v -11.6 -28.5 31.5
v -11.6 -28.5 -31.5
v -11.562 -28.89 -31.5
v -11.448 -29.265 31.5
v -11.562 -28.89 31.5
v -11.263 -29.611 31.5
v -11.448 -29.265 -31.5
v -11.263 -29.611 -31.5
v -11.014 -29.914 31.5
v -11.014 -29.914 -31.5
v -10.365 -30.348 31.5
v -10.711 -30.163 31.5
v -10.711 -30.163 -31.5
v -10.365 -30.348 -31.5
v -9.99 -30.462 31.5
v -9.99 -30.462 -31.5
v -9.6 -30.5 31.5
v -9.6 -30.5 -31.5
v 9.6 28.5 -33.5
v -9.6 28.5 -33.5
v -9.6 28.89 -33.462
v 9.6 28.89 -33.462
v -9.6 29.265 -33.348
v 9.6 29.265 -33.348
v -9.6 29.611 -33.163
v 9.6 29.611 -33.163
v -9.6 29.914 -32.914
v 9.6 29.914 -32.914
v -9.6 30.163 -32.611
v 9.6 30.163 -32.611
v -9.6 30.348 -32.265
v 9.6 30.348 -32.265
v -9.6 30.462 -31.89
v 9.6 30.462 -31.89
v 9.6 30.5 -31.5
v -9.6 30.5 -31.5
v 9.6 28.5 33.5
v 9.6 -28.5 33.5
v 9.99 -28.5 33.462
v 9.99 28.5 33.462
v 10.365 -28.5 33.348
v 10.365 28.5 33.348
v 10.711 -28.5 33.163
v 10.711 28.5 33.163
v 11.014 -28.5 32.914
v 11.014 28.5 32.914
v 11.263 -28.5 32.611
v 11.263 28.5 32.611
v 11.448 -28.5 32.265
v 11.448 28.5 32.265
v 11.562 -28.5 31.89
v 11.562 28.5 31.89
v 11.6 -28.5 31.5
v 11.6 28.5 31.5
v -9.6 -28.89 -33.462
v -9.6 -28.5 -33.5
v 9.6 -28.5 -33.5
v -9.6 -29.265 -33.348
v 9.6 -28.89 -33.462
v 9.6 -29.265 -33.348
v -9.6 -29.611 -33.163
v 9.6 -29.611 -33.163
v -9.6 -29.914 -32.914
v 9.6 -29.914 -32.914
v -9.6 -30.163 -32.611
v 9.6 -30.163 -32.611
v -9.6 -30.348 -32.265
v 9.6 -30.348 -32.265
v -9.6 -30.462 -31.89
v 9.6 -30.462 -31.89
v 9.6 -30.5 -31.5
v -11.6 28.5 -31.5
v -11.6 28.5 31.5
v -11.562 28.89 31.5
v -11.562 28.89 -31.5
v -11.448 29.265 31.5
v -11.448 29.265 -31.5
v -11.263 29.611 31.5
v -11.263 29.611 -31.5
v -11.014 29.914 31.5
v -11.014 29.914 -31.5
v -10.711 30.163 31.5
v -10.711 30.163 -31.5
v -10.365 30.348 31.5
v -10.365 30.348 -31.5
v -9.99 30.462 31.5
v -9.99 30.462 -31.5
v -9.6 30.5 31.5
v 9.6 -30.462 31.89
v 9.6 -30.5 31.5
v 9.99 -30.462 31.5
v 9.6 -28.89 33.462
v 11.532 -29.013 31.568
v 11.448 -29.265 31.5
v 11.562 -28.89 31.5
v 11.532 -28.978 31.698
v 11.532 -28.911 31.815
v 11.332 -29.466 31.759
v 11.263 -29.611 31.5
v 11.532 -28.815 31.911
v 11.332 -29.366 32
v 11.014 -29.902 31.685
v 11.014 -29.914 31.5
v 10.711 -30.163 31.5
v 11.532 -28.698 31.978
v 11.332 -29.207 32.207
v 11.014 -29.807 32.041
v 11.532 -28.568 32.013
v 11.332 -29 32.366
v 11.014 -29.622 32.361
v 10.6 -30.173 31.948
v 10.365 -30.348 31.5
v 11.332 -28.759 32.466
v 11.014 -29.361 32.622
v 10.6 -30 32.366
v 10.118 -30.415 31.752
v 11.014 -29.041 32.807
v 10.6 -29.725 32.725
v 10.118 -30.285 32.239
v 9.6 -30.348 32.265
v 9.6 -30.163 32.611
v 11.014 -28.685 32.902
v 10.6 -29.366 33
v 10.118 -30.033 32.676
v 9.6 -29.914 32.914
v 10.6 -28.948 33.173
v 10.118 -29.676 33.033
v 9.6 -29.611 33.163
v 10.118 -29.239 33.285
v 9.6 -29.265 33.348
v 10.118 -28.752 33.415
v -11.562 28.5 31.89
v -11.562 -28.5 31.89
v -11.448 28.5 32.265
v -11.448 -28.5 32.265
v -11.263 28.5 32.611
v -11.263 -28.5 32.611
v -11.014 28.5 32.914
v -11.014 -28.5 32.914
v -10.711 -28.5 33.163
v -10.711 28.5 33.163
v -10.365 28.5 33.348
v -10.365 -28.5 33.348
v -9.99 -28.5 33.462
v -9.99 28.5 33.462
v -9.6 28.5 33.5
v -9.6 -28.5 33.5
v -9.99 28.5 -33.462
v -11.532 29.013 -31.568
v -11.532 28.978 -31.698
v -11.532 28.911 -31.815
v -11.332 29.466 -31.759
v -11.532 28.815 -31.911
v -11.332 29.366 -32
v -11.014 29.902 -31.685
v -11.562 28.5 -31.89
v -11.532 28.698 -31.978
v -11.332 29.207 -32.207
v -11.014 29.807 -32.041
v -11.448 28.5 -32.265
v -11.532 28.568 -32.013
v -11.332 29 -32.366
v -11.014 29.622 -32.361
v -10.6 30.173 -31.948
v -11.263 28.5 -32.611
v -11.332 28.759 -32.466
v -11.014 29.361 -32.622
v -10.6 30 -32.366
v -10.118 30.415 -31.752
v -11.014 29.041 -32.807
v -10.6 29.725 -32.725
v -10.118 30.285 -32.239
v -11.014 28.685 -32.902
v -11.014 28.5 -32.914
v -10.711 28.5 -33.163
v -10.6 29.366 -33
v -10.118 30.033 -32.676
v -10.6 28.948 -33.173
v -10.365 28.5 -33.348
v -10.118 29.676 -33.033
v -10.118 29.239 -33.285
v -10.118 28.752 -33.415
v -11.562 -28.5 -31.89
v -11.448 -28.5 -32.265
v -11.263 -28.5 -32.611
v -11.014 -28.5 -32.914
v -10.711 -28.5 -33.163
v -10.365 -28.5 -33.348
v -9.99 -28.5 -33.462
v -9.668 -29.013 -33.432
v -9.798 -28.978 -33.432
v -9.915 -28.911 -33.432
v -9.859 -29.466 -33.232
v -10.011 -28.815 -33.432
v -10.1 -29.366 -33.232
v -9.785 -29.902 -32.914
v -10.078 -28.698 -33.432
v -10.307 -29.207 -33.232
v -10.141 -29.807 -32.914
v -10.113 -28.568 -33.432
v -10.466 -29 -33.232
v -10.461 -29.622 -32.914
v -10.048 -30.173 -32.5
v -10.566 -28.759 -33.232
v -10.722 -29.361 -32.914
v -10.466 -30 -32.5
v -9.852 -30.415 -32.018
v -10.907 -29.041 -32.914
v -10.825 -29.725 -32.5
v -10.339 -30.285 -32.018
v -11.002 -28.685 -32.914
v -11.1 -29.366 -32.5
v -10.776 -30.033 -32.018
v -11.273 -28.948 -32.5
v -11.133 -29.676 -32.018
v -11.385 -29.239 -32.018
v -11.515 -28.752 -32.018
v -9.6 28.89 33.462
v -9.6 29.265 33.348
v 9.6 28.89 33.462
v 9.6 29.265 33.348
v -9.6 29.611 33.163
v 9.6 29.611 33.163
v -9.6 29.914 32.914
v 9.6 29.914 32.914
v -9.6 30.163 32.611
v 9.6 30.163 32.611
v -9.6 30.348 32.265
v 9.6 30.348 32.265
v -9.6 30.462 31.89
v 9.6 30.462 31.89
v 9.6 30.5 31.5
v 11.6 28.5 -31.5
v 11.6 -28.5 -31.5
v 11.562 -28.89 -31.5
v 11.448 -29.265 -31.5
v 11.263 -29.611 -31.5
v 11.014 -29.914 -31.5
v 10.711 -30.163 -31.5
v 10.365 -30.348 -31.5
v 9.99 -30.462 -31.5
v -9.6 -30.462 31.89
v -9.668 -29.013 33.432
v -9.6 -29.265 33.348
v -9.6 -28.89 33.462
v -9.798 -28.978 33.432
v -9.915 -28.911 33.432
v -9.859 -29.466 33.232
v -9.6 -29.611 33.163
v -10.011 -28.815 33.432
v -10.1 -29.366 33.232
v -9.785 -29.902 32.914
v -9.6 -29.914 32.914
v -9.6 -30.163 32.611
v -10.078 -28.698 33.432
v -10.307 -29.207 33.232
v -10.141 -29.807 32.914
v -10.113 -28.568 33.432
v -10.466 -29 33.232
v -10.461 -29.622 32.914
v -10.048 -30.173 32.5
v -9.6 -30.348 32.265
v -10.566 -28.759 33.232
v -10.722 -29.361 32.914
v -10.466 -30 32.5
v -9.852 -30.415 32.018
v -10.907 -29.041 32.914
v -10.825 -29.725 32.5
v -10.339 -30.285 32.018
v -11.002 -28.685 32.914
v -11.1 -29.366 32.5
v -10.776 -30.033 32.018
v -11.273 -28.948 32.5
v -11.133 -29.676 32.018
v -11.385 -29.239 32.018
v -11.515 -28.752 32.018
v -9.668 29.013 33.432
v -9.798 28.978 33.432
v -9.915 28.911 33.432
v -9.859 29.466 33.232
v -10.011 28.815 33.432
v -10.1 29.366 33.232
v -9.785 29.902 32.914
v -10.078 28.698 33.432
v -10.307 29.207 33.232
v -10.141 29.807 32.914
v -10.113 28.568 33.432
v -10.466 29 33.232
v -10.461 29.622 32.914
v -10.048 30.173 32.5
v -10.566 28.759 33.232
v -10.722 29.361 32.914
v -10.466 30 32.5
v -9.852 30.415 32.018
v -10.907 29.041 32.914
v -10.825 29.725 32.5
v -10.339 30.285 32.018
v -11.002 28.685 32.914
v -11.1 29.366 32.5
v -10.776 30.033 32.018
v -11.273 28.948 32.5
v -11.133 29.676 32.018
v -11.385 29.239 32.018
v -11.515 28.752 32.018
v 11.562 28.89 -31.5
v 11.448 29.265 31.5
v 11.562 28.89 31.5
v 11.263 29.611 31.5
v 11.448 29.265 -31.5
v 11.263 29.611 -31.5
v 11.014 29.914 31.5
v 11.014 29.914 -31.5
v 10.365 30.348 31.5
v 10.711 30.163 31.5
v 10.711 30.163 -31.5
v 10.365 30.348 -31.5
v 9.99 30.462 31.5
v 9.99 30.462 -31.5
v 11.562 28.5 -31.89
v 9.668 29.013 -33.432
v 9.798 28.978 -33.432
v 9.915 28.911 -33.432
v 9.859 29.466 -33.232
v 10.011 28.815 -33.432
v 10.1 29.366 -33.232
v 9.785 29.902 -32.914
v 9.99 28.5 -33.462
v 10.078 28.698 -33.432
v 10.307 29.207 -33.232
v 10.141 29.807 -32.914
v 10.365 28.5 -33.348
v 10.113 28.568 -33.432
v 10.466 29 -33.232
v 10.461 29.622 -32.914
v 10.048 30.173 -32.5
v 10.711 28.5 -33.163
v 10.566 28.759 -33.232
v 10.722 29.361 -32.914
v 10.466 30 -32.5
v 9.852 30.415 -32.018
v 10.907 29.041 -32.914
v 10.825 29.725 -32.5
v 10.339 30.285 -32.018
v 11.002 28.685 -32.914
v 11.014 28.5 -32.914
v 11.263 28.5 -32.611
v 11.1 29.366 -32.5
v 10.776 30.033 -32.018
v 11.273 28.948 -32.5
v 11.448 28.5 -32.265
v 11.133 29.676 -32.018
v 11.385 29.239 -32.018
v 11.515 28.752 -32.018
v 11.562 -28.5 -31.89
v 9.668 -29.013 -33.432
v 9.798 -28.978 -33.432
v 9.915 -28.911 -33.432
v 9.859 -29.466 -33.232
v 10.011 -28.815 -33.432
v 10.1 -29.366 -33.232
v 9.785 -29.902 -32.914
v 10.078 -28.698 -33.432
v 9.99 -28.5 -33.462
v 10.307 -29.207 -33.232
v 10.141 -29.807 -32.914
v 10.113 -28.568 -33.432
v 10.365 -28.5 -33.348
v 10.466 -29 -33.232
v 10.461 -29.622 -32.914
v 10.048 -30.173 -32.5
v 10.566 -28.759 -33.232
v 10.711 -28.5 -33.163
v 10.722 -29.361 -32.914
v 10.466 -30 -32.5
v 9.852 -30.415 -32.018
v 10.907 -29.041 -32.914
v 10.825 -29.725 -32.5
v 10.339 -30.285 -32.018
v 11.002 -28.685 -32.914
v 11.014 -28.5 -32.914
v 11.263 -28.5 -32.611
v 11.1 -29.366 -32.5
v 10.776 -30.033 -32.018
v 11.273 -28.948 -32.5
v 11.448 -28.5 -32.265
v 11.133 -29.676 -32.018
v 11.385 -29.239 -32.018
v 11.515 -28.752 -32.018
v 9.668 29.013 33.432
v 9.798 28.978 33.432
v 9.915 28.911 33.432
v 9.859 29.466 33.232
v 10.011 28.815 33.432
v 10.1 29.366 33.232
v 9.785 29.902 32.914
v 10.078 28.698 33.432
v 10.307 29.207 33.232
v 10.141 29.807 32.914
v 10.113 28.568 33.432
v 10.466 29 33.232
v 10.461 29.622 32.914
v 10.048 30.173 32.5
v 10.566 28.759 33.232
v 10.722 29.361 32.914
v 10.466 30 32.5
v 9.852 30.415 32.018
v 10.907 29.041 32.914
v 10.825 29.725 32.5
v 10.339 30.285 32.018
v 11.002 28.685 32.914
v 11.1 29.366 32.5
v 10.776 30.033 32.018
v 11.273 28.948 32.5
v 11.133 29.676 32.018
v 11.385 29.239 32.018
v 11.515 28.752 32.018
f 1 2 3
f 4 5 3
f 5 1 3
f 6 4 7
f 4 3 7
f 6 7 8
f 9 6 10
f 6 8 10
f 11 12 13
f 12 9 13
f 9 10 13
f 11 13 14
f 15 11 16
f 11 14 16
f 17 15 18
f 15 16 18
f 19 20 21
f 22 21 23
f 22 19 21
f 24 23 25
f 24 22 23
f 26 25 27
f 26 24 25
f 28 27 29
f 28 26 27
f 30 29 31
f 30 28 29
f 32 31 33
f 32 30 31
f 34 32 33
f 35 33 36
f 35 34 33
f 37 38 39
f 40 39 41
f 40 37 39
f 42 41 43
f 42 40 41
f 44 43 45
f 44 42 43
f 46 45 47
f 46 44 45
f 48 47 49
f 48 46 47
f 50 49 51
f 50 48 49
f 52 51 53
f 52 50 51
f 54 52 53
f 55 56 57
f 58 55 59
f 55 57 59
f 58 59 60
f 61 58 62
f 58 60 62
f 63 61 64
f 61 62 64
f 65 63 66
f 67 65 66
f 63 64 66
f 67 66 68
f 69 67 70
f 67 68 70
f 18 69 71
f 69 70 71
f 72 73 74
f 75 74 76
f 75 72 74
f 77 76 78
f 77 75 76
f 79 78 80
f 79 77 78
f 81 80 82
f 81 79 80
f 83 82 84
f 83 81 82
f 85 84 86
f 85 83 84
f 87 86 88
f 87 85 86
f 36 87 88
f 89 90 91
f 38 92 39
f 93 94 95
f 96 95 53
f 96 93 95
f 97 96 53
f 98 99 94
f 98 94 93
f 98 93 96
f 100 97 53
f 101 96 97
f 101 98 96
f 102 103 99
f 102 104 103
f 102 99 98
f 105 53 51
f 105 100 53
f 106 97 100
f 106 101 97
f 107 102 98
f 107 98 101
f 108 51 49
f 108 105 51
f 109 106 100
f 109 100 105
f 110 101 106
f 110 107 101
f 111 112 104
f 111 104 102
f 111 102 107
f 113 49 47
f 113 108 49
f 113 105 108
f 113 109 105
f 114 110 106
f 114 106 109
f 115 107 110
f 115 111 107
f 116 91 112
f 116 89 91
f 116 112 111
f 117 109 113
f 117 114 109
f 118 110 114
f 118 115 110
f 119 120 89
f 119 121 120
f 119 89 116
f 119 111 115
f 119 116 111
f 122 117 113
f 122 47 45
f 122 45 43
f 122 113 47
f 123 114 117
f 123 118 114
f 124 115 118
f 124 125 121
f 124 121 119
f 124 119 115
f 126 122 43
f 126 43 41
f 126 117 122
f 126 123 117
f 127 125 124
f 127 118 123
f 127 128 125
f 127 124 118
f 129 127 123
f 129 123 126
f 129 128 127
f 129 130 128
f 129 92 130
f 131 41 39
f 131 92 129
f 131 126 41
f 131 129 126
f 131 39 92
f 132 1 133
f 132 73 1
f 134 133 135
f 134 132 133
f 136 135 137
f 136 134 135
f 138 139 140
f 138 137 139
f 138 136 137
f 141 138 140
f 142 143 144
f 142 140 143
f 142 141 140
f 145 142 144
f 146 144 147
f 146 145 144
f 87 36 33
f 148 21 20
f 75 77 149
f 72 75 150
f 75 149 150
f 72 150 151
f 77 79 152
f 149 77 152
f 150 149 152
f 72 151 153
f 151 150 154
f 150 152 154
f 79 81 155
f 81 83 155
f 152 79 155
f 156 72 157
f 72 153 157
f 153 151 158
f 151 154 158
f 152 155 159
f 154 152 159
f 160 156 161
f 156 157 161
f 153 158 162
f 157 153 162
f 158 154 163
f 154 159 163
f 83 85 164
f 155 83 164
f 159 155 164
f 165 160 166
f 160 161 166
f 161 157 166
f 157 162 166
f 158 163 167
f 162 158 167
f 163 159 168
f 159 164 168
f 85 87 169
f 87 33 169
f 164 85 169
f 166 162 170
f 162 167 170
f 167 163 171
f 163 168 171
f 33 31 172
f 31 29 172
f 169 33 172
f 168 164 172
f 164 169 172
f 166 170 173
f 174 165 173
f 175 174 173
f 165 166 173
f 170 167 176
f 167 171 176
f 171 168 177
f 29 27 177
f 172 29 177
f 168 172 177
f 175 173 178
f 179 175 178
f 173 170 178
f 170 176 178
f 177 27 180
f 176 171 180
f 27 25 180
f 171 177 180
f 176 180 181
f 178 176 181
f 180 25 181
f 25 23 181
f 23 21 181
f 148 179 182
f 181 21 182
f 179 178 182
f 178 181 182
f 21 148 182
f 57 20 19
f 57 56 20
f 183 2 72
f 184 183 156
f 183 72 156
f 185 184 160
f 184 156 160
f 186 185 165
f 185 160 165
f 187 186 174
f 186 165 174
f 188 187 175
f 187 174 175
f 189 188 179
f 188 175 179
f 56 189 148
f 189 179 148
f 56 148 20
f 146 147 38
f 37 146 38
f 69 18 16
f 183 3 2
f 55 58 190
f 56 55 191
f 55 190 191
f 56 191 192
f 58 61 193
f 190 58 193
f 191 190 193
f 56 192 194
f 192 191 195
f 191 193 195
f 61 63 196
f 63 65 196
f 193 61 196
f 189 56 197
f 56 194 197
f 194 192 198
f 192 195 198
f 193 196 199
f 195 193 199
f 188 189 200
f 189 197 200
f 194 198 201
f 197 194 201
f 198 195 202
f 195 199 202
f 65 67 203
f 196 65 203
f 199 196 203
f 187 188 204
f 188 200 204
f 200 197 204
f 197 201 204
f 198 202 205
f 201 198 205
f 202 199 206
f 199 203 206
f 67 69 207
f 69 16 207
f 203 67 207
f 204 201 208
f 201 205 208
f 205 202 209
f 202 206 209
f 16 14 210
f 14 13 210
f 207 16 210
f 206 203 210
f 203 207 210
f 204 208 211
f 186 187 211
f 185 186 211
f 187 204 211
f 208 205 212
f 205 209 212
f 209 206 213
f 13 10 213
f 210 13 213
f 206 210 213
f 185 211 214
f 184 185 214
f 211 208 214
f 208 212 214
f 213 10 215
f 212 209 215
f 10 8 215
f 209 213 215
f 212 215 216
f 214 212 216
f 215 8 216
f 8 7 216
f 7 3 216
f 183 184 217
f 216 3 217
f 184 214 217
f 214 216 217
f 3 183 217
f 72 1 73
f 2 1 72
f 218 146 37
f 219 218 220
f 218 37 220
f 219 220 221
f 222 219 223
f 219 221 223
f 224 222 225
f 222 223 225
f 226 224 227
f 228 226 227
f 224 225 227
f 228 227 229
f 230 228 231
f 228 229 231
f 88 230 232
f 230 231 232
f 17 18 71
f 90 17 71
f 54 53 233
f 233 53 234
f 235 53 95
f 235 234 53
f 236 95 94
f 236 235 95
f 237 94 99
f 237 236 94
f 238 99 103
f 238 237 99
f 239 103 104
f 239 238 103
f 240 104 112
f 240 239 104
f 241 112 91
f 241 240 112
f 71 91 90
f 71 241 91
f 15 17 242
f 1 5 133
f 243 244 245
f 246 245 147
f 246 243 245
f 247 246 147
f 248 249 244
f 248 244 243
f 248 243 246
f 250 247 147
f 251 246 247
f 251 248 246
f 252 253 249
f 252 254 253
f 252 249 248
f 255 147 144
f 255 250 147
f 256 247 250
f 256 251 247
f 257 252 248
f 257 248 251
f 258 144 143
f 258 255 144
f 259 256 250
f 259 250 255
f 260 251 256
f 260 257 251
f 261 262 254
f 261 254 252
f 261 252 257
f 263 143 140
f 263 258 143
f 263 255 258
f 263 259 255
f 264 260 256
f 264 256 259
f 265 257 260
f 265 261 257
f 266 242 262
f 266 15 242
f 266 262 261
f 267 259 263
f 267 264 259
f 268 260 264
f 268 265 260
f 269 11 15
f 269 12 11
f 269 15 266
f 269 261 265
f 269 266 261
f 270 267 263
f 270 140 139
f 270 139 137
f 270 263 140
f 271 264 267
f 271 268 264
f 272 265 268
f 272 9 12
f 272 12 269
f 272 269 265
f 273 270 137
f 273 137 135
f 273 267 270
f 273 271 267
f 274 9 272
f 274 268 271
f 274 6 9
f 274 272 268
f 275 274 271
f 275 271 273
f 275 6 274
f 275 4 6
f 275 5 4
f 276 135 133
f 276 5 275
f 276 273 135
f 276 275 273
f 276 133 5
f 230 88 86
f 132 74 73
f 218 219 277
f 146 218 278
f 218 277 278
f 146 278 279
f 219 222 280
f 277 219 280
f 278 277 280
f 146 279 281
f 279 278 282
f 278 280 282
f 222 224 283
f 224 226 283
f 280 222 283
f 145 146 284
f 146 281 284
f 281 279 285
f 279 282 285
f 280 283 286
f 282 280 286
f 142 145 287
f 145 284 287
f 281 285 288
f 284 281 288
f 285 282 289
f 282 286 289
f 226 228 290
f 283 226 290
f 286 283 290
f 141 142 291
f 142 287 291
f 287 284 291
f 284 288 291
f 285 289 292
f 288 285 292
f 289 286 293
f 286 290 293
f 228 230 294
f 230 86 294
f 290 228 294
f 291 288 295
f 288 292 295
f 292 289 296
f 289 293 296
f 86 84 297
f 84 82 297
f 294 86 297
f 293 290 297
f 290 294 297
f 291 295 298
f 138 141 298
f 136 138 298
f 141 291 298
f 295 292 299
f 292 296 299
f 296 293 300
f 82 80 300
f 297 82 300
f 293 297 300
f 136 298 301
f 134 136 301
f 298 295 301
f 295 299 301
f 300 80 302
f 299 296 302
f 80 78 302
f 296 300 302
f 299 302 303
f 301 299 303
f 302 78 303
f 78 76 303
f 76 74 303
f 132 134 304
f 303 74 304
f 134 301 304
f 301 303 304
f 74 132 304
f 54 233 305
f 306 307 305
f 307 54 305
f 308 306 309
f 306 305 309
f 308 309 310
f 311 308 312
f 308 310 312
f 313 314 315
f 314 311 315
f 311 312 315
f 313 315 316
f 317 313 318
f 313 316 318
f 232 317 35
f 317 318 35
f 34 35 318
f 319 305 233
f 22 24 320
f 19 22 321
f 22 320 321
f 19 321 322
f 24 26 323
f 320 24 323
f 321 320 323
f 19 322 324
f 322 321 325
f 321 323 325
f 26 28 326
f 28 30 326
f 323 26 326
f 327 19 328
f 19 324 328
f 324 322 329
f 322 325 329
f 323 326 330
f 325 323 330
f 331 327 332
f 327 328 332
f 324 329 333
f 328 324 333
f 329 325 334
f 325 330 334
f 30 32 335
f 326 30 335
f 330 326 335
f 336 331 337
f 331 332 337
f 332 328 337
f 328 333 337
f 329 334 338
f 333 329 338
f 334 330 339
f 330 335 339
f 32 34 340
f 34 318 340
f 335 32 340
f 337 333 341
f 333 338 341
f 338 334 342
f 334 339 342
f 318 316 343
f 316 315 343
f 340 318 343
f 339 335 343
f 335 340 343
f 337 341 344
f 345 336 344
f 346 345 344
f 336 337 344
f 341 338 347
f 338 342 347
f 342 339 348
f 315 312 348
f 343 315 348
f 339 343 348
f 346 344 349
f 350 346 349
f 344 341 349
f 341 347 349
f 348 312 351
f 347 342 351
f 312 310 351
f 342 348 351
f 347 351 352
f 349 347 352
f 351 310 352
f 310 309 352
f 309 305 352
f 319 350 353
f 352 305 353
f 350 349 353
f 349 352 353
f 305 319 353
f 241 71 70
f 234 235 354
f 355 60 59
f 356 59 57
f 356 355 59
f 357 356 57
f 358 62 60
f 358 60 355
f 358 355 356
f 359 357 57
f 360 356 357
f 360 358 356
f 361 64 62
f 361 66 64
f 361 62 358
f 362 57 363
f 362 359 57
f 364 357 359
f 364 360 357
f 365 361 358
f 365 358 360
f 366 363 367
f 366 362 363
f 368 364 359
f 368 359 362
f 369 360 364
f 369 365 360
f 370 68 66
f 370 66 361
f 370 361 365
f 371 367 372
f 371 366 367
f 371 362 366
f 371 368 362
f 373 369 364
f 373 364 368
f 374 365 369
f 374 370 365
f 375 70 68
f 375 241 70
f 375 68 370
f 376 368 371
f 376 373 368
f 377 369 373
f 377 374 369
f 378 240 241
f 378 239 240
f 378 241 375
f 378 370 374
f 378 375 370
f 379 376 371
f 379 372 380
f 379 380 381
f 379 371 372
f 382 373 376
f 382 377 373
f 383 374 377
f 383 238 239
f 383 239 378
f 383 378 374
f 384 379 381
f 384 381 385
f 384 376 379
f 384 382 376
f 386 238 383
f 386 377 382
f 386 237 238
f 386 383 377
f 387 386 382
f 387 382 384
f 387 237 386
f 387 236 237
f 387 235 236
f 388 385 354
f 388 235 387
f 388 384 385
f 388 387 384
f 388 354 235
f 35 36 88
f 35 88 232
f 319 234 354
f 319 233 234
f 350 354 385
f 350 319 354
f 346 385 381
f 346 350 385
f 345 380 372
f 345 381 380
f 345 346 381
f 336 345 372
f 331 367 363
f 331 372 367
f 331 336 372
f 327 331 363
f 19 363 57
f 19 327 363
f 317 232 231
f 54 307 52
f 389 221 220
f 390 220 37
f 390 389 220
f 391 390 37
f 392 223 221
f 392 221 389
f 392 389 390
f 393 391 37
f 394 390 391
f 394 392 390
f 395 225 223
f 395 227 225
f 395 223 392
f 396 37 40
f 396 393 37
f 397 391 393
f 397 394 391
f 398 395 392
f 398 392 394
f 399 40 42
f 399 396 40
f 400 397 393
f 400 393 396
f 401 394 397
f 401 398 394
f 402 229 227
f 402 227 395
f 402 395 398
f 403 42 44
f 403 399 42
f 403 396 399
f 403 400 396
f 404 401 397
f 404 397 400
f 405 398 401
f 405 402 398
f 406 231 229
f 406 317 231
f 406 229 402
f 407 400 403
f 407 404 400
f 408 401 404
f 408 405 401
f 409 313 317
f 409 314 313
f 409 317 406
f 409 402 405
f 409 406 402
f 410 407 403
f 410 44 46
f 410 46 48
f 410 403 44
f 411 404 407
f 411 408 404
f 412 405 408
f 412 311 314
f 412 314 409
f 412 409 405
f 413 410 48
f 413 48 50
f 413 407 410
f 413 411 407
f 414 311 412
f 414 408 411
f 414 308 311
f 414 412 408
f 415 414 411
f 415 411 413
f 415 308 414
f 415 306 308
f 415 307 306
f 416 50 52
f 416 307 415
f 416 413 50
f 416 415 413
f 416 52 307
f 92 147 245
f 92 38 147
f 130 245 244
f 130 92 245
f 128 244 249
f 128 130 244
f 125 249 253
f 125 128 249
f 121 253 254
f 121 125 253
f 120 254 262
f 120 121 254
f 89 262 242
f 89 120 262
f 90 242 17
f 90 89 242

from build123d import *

# Parameters (mm, degrees)
EXTRUDE_1_DEPTH      = 30.5
EXTRUDE_1_DEPTH_BACK = 30.5
SKETCH_1_W           = 23.2
SKETCH_1_H           = 67
FILLET_2_R           = 2


with BuildPart() as part:
    # Эскиз1 → Бобышка-Вытянуть1 (new, two sides: drawn at the far end of the back side and taken through both)
    with BuildSketch(Plane(origin=(0, 0, 0), x_dir=(1, 0, 0), z_dir=(0, 1, 0)).offset(-EXTRUDE_1_DEPTH_BACK)):
        Rectangle(SKETCH_1_W, SKETCH_1_H)
    extrude(amount=EXTRUDE_1_DEPTH + EXTRUDE_1_DEPTH_BACK)

    # Скругление2
    fillet_2_edges = [part.edges().sort_by_distance(p)[0] for p in [
        (-11.6, -30.5, 0),
        (11.6, 30.5, 0),
        (0, 30.5, -33.5),
        (0, -30.5, 33.5),
        (-11.6, 30.5, 0),
        (0, 30.5, 33.5),
        (11.6, -30.5, 0),
        (0, -30.5, -33.5),
        (11.6, 0, 33.5),
        (-11.6, 0, 33.5),
        (-11.6, 0, -33.5),
        (11.6, 0, -33.5),
    ]]
    fillet(fillet_2_edges, radius=FILLET_2_R)


solid = part.part
